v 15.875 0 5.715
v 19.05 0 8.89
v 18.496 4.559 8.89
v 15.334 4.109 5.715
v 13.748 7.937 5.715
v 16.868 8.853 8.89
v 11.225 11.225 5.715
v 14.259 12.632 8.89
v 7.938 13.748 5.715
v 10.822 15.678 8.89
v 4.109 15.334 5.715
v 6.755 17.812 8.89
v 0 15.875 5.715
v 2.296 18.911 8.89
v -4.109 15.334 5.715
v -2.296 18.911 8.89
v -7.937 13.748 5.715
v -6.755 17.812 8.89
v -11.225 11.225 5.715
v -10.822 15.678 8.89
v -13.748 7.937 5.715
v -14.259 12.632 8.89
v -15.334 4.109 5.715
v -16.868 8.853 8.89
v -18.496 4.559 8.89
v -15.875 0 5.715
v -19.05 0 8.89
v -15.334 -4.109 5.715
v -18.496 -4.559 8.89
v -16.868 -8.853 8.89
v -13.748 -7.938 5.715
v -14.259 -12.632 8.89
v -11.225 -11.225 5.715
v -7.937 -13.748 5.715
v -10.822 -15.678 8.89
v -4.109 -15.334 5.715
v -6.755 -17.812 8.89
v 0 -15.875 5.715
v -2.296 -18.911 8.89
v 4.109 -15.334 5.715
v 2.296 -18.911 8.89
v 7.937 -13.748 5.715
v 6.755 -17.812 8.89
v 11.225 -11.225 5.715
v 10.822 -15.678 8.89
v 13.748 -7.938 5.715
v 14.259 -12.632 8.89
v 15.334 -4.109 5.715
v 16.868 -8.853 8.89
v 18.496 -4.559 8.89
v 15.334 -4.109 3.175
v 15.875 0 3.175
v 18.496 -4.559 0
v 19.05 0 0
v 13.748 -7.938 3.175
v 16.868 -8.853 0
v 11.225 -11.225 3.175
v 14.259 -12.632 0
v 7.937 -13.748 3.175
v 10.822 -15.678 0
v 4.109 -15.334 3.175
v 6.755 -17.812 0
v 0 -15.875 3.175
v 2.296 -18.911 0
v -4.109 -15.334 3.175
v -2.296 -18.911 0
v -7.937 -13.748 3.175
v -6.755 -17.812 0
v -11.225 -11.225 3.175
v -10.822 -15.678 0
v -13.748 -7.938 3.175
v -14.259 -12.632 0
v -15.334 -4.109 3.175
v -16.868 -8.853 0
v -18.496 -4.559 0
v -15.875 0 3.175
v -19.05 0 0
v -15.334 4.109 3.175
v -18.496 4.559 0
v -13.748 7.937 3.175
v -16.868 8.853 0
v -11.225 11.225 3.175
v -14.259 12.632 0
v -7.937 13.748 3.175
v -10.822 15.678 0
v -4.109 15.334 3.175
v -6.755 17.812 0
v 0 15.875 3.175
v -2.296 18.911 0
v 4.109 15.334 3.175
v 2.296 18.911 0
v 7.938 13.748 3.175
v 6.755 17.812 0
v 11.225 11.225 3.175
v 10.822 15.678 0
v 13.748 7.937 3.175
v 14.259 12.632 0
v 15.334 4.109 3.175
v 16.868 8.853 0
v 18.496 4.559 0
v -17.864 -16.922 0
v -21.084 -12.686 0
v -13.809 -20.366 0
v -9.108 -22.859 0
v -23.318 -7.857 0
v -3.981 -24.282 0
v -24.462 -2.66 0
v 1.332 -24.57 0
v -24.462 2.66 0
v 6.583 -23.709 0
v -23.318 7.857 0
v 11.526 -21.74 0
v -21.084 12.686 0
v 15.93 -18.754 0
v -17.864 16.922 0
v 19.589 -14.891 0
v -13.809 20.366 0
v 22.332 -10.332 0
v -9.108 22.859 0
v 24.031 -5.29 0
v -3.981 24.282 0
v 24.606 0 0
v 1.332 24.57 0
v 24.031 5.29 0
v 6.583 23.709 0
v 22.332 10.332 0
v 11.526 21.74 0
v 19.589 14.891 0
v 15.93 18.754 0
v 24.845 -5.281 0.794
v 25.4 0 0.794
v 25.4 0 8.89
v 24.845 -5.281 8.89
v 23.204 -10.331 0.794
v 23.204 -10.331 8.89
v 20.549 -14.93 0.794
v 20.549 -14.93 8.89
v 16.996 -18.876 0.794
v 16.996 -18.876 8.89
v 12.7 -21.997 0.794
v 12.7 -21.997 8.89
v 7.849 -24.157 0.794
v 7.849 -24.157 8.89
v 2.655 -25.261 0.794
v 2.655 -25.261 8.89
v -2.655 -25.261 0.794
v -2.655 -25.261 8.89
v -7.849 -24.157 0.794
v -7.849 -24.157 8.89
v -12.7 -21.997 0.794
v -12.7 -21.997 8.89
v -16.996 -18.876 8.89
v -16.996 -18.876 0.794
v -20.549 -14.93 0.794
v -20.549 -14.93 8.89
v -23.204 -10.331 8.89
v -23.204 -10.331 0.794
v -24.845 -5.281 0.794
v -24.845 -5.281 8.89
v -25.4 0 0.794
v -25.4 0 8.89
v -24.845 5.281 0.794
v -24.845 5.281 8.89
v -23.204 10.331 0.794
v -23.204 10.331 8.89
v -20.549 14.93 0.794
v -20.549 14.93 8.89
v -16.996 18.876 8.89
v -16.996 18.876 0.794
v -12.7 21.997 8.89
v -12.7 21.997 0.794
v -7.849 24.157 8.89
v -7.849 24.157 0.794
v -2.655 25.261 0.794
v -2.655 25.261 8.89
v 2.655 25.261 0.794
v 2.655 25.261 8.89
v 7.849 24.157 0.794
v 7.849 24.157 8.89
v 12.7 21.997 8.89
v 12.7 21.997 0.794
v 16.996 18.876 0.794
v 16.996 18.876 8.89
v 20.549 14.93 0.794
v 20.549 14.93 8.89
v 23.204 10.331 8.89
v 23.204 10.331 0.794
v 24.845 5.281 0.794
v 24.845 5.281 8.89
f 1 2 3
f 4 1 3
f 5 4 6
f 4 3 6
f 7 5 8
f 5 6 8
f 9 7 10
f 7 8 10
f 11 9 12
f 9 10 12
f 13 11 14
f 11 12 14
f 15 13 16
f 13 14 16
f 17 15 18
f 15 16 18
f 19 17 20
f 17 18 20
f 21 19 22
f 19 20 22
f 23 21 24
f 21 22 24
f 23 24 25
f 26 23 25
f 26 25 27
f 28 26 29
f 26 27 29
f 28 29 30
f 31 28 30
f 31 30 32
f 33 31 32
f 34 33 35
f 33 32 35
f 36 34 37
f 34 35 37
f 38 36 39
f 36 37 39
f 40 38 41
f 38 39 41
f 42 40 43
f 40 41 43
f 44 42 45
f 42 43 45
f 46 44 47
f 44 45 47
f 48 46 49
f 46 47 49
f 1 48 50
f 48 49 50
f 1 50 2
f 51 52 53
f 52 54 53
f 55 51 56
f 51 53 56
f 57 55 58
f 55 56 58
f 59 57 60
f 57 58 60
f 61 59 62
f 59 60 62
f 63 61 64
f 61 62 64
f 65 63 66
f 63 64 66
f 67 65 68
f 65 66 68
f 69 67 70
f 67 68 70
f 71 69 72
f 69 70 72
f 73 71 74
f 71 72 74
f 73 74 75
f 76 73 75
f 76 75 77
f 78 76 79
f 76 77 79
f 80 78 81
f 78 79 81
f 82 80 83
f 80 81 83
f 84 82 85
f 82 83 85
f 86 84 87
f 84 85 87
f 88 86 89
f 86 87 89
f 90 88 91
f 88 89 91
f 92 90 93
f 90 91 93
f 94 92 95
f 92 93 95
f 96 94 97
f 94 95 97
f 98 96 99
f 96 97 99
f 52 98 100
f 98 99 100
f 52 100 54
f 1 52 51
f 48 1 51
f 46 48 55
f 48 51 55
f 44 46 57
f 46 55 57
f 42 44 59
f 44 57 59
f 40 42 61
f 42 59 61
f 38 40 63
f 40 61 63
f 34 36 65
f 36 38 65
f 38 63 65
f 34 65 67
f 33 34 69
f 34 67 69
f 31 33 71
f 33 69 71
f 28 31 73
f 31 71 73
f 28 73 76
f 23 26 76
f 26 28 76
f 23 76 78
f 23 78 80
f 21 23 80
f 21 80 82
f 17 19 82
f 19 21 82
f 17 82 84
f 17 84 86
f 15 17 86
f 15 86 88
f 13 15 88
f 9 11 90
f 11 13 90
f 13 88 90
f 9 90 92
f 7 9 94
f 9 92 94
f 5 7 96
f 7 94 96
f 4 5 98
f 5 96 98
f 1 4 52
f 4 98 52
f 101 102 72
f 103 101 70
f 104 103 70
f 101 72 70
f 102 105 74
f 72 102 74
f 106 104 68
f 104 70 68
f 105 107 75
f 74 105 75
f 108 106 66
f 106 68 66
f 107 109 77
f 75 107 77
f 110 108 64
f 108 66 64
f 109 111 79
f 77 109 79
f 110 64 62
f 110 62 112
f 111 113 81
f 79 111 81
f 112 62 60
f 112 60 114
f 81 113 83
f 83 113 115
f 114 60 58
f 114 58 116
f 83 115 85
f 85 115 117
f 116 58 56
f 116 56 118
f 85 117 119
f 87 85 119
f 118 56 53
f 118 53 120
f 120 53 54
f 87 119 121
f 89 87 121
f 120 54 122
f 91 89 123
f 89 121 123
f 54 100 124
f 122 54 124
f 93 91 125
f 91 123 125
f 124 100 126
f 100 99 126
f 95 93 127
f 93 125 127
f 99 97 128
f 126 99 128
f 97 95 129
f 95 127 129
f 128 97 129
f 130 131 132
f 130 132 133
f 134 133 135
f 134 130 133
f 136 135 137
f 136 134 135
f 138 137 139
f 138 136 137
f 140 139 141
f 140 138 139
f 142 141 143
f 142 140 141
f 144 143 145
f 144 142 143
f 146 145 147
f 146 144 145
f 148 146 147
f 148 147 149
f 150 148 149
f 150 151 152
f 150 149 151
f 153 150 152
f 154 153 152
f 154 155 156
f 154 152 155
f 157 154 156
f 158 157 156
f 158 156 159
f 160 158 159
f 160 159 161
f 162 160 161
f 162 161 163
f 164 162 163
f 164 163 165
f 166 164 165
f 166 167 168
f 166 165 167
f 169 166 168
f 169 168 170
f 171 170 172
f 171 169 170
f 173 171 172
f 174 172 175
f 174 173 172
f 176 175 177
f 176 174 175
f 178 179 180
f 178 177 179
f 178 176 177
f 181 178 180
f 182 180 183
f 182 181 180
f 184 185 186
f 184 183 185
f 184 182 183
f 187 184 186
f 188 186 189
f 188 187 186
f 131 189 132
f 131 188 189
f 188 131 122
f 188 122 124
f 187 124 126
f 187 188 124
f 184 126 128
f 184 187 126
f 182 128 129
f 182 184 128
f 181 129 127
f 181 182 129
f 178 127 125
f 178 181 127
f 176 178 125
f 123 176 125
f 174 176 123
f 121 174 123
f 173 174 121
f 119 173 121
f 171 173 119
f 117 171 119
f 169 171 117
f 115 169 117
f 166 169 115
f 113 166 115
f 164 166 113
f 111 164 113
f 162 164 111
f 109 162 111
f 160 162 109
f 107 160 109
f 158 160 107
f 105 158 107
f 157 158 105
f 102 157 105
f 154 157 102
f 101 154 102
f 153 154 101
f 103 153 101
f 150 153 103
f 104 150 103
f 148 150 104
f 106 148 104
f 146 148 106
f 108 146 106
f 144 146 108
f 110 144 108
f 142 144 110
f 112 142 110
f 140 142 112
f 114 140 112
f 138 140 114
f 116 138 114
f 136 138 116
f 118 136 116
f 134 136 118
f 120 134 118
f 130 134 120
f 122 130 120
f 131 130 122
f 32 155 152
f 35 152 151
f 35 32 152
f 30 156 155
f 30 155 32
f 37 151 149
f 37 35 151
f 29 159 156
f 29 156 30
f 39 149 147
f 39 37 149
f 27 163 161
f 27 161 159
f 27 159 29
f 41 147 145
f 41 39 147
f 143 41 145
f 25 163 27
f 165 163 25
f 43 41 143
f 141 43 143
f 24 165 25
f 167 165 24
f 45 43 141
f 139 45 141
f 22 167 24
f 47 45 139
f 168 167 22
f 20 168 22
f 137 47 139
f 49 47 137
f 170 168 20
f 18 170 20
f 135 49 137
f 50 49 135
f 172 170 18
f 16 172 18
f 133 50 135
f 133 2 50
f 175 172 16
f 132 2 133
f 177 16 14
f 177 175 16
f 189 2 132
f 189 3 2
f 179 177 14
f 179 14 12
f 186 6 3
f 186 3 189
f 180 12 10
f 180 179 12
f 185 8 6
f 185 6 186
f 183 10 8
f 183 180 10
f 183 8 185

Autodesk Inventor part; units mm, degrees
ref_plane "YZ Plane" through (0, 0, 0) normal (1, 0, 0) x (0, 1, 0)
ref_plane "XZ Plane" through (0, 0, 0) normal (0, 1, 0) x (-1, 0, 0)
ref_plane "XY Plane" through (0, 0, 0) normal (0, 0, 1) x (1, 0, 0)
sketch "Sketch1" plane through (0, 0, 0) normal (0, 0, 1) x (1, 0, 0)
  circle A0 centre (0, 0) radius 15.875
  circle A1 centre (0, 0) radius 25.4
  dimension "d0" = 31.75
  dimension "d1" = 50.8
extrude "Extrusion1" add sketch "Sketch1" along normal blind 8.89
chamfer "Chamfer1" distance 0.7937 angle 45 1 edges at (-25.4, 0, 0)
chamfer "Chamfer2" distance 3.175 angle 45 2 edges at (-15.875, 0, 8.89) (-15.875, 0, 0)
properties part number "Tire" material "Rubber, Silicone"
